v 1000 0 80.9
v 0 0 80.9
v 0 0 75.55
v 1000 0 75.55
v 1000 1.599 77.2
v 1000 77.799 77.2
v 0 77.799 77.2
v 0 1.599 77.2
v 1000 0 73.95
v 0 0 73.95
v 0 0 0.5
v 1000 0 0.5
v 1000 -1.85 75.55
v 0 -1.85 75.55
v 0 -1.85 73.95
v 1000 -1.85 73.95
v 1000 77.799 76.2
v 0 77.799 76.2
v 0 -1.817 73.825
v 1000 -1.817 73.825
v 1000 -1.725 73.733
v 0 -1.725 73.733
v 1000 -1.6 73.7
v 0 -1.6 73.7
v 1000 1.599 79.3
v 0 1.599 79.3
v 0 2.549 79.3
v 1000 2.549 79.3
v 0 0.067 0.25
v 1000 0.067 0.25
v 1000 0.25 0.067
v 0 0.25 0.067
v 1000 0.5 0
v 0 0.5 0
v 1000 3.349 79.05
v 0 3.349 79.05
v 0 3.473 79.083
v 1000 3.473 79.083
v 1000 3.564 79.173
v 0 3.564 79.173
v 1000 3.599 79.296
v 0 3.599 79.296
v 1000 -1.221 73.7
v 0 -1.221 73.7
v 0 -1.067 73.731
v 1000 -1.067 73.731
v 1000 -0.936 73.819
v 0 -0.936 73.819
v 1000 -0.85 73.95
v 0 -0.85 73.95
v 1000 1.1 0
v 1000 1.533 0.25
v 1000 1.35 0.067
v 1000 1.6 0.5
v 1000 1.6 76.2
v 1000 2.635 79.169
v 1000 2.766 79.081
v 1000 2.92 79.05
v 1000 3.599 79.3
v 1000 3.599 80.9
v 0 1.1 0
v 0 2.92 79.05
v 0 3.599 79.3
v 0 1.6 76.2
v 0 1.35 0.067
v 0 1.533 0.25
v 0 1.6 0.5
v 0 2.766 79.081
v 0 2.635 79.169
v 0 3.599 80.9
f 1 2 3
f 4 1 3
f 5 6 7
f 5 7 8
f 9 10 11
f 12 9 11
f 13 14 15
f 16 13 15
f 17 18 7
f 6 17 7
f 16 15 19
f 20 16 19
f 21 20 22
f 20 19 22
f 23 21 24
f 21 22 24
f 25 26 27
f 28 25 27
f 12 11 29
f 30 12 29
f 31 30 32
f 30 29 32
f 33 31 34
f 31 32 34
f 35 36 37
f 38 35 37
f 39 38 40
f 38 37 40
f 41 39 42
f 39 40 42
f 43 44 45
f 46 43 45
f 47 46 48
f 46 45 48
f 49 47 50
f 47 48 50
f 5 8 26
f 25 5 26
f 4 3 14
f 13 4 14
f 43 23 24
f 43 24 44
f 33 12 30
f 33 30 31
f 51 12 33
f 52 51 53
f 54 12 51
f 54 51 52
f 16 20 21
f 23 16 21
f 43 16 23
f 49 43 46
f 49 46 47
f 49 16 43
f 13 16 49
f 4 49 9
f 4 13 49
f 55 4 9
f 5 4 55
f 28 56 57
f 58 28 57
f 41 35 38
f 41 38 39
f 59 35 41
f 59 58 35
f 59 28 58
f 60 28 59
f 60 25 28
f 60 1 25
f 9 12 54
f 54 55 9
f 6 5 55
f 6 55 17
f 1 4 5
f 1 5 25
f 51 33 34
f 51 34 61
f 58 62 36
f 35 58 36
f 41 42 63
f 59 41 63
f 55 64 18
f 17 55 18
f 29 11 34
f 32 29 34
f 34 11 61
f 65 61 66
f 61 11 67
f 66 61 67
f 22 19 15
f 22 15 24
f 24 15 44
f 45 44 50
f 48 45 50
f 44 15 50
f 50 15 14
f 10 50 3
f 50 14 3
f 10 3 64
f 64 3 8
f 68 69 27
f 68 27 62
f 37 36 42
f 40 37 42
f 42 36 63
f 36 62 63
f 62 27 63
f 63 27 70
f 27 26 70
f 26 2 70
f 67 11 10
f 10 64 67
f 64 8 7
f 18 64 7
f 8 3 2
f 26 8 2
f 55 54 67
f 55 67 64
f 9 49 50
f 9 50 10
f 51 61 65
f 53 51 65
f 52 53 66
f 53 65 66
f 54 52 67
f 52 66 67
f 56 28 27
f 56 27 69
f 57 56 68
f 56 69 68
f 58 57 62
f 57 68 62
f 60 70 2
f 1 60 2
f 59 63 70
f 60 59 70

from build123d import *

# Parameters (mm, degrees)
F1_DEPTH = 1000


with BuildPart() as f1:
    # F0 (on Right) → F1 (new body)
    with BuildSketch(Plane.YZ):
        with BuildLine():
            Line((0, 73.95), (0, 0.5))
            ThreePointArc((0, 0.5), (0.146447, 0.146447), (0.5, 0))
            Line((0.5, 0), (1.1, 0))
            ThreePointArc((1.1, 0), (1.453553, 0.146447), (1.6, 0.5))
            Line((1.6, 0.5), (1.6, 76.2))
            Line((1.6, 76.2), (77.798804, 76.2))
            Line((77.798804, 76.2), (77.798804, 77.2))
            Line((77.798804, 77.2), (1.598804, 77.2))
            Line((1.598804, 77.2), (1.598804, 79.3))
            Line((1.598804, 79.3), (2.548804, 79.3))
            ThreePointArc((2.548804, 79.3), (2.696007, 79.118338), (2.919614, 79.05))
            Line((2.919614, 79.05), (3.348827, 79.05))
            ThreePointArc((3.348827, 79.05), (3.524228, 79.121858), (3.598797, 79.296124))
            Line((3.598797, 79.296124), (3.598857, 79.3))
            Line((3.598857, 79.3), (3.598857, 80.9))
            Line((3.598857, 80.9), (0, 80.9))
            Line((0, 80.9), (0, 75.55))
            Line((0, 75.55), (-1.85, 75.55))
            Line((-1.85, 75.55), (-1.85, 73.95))
            ThreePointArc((-1.85, 73.95), (-1.776777, 73.773223), (-1.6, 73.7))
            Line((-1.6, 73.7), (-1.22081, 73.7))
            ThreePointArc((-1.22081, 73.7), (-0.997203, 73.768338), (-0.85, 73.95))
            Line((-0.85, 73.95), (0, 73.95))
        make_face()
    extrude(amount=F1_DEPTH)


solid = f1.part
